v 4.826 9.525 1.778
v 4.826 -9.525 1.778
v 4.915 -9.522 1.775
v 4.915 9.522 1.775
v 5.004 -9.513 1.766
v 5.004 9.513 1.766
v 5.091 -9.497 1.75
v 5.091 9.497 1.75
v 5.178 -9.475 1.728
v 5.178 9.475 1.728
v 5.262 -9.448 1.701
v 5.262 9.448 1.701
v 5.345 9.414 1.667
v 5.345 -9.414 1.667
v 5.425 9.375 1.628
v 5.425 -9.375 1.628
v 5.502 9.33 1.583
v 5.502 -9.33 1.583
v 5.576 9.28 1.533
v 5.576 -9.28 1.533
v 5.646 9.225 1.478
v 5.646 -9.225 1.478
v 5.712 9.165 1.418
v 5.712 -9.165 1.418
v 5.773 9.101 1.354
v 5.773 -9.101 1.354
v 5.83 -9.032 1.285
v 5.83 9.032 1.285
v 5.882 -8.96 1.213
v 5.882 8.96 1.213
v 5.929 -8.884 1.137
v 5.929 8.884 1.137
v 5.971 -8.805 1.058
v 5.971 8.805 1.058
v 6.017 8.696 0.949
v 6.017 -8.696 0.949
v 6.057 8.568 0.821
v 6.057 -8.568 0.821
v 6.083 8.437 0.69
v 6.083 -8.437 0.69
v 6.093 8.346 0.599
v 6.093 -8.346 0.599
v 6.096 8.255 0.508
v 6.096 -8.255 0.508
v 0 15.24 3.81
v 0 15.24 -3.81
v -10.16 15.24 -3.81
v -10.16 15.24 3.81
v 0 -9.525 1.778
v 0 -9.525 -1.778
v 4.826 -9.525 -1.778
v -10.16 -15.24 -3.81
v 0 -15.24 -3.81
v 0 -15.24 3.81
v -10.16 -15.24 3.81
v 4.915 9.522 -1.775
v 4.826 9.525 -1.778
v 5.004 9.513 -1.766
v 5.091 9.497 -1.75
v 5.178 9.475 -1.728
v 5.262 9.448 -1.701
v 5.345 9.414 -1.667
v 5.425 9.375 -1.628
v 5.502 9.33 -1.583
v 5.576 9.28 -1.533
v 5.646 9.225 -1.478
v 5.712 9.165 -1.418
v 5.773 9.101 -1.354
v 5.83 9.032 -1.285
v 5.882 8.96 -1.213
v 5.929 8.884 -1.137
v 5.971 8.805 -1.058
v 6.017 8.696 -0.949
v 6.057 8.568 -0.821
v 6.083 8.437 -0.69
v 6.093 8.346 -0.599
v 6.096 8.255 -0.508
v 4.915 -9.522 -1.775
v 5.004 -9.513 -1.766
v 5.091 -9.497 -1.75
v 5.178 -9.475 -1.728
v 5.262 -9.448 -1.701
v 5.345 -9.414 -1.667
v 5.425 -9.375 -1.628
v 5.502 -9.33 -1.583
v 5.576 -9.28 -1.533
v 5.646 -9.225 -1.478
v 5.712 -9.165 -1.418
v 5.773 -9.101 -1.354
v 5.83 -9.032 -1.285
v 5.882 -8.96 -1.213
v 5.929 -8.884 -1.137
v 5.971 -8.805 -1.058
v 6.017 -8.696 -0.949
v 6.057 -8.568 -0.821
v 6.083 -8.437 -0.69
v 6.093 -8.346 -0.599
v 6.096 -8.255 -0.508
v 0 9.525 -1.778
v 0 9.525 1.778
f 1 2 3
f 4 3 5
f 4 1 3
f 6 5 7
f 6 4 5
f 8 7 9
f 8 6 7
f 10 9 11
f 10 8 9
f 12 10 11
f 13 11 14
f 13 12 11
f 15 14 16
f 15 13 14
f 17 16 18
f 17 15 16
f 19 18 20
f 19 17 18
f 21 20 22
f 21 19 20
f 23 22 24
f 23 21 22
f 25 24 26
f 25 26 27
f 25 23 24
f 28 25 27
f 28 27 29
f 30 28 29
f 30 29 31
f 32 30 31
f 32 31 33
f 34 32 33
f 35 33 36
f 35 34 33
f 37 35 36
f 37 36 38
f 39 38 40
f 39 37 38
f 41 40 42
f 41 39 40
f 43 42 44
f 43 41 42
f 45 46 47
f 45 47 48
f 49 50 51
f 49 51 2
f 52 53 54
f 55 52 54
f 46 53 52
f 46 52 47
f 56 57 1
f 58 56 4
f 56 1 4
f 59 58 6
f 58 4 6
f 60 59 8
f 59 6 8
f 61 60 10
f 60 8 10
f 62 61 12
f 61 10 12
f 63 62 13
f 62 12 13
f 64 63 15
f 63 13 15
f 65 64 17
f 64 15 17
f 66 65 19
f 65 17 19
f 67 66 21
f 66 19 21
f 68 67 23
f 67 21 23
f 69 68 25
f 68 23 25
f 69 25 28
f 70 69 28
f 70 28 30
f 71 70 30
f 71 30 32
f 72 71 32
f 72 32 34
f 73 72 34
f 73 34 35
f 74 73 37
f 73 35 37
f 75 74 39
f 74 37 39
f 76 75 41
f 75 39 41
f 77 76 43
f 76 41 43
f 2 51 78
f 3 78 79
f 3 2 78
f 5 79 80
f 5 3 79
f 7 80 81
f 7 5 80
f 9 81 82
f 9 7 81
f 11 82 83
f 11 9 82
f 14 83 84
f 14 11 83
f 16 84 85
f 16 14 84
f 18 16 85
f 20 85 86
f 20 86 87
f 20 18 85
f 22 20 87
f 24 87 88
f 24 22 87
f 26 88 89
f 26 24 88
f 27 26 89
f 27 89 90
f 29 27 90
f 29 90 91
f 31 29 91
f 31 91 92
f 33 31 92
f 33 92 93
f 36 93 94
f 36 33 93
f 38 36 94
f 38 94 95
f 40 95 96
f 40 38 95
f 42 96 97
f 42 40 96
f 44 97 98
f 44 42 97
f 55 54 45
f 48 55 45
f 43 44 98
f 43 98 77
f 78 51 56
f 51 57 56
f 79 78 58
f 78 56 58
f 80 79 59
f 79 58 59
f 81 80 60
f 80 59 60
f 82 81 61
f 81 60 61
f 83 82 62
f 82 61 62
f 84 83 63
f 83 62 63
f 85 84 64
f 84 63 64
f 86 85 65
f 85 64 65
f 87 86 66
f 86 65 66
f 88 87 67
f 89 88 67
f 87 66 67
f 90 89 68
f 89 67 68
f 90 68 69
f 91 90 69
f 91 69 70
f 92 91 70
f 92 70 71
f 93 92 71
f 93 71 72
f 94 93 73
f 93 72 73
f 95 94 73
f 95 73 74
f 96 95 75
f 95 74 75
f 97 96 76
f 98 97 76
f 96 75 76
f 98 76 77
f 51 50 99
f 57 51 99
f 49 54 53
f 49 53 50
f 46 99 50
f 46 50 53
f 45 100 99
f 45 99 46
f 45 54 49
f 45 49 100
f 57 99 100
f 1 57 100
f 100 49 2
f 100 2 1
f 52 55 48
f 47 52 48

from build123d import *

# Parameters (mm, degrees)
F0_W     = 30.48
F0_H     = 7.62
F0_W_2   = 19.05
F0_H_2   = 3.556
F1_DEPTH = 10.16
F2_W     = 19.05
F2_H     = 3.556
F3_DEPTH = 6.096
F4_R     = 1.27


with BuildPart() as f1:
    # F0 (on Right) → F1 (new body)
    with BuildSketch(Plane.YZ):
        Rectangle(F0_W, F0_H)
        Rectangle(F0_W_2, F0_H_2, mode=Mode.SUBTRACT)
        Rectangle(F0_W_2, F0_H_2)
    extrude(amount=-F1_DEPTH)

    # F2 (on face) → F3 (join)
    with BuildSketch(Plane.YZ):
        Rectangle(F2_W, F2_H)
    extrude(amount=F3_DEPTH)

    # F4
    f4_edges = [f1.edges().sort_by_distance(p)[0] for p in [
        (6.096, 0, 1.778),
        (6.096, -9.525, 0),
        (6.096, 0, -1.778),
        (6.096, 9.525, 0),
    ]]
    fillet(f4_edges, radius=F4_R)


solid = f1.part
